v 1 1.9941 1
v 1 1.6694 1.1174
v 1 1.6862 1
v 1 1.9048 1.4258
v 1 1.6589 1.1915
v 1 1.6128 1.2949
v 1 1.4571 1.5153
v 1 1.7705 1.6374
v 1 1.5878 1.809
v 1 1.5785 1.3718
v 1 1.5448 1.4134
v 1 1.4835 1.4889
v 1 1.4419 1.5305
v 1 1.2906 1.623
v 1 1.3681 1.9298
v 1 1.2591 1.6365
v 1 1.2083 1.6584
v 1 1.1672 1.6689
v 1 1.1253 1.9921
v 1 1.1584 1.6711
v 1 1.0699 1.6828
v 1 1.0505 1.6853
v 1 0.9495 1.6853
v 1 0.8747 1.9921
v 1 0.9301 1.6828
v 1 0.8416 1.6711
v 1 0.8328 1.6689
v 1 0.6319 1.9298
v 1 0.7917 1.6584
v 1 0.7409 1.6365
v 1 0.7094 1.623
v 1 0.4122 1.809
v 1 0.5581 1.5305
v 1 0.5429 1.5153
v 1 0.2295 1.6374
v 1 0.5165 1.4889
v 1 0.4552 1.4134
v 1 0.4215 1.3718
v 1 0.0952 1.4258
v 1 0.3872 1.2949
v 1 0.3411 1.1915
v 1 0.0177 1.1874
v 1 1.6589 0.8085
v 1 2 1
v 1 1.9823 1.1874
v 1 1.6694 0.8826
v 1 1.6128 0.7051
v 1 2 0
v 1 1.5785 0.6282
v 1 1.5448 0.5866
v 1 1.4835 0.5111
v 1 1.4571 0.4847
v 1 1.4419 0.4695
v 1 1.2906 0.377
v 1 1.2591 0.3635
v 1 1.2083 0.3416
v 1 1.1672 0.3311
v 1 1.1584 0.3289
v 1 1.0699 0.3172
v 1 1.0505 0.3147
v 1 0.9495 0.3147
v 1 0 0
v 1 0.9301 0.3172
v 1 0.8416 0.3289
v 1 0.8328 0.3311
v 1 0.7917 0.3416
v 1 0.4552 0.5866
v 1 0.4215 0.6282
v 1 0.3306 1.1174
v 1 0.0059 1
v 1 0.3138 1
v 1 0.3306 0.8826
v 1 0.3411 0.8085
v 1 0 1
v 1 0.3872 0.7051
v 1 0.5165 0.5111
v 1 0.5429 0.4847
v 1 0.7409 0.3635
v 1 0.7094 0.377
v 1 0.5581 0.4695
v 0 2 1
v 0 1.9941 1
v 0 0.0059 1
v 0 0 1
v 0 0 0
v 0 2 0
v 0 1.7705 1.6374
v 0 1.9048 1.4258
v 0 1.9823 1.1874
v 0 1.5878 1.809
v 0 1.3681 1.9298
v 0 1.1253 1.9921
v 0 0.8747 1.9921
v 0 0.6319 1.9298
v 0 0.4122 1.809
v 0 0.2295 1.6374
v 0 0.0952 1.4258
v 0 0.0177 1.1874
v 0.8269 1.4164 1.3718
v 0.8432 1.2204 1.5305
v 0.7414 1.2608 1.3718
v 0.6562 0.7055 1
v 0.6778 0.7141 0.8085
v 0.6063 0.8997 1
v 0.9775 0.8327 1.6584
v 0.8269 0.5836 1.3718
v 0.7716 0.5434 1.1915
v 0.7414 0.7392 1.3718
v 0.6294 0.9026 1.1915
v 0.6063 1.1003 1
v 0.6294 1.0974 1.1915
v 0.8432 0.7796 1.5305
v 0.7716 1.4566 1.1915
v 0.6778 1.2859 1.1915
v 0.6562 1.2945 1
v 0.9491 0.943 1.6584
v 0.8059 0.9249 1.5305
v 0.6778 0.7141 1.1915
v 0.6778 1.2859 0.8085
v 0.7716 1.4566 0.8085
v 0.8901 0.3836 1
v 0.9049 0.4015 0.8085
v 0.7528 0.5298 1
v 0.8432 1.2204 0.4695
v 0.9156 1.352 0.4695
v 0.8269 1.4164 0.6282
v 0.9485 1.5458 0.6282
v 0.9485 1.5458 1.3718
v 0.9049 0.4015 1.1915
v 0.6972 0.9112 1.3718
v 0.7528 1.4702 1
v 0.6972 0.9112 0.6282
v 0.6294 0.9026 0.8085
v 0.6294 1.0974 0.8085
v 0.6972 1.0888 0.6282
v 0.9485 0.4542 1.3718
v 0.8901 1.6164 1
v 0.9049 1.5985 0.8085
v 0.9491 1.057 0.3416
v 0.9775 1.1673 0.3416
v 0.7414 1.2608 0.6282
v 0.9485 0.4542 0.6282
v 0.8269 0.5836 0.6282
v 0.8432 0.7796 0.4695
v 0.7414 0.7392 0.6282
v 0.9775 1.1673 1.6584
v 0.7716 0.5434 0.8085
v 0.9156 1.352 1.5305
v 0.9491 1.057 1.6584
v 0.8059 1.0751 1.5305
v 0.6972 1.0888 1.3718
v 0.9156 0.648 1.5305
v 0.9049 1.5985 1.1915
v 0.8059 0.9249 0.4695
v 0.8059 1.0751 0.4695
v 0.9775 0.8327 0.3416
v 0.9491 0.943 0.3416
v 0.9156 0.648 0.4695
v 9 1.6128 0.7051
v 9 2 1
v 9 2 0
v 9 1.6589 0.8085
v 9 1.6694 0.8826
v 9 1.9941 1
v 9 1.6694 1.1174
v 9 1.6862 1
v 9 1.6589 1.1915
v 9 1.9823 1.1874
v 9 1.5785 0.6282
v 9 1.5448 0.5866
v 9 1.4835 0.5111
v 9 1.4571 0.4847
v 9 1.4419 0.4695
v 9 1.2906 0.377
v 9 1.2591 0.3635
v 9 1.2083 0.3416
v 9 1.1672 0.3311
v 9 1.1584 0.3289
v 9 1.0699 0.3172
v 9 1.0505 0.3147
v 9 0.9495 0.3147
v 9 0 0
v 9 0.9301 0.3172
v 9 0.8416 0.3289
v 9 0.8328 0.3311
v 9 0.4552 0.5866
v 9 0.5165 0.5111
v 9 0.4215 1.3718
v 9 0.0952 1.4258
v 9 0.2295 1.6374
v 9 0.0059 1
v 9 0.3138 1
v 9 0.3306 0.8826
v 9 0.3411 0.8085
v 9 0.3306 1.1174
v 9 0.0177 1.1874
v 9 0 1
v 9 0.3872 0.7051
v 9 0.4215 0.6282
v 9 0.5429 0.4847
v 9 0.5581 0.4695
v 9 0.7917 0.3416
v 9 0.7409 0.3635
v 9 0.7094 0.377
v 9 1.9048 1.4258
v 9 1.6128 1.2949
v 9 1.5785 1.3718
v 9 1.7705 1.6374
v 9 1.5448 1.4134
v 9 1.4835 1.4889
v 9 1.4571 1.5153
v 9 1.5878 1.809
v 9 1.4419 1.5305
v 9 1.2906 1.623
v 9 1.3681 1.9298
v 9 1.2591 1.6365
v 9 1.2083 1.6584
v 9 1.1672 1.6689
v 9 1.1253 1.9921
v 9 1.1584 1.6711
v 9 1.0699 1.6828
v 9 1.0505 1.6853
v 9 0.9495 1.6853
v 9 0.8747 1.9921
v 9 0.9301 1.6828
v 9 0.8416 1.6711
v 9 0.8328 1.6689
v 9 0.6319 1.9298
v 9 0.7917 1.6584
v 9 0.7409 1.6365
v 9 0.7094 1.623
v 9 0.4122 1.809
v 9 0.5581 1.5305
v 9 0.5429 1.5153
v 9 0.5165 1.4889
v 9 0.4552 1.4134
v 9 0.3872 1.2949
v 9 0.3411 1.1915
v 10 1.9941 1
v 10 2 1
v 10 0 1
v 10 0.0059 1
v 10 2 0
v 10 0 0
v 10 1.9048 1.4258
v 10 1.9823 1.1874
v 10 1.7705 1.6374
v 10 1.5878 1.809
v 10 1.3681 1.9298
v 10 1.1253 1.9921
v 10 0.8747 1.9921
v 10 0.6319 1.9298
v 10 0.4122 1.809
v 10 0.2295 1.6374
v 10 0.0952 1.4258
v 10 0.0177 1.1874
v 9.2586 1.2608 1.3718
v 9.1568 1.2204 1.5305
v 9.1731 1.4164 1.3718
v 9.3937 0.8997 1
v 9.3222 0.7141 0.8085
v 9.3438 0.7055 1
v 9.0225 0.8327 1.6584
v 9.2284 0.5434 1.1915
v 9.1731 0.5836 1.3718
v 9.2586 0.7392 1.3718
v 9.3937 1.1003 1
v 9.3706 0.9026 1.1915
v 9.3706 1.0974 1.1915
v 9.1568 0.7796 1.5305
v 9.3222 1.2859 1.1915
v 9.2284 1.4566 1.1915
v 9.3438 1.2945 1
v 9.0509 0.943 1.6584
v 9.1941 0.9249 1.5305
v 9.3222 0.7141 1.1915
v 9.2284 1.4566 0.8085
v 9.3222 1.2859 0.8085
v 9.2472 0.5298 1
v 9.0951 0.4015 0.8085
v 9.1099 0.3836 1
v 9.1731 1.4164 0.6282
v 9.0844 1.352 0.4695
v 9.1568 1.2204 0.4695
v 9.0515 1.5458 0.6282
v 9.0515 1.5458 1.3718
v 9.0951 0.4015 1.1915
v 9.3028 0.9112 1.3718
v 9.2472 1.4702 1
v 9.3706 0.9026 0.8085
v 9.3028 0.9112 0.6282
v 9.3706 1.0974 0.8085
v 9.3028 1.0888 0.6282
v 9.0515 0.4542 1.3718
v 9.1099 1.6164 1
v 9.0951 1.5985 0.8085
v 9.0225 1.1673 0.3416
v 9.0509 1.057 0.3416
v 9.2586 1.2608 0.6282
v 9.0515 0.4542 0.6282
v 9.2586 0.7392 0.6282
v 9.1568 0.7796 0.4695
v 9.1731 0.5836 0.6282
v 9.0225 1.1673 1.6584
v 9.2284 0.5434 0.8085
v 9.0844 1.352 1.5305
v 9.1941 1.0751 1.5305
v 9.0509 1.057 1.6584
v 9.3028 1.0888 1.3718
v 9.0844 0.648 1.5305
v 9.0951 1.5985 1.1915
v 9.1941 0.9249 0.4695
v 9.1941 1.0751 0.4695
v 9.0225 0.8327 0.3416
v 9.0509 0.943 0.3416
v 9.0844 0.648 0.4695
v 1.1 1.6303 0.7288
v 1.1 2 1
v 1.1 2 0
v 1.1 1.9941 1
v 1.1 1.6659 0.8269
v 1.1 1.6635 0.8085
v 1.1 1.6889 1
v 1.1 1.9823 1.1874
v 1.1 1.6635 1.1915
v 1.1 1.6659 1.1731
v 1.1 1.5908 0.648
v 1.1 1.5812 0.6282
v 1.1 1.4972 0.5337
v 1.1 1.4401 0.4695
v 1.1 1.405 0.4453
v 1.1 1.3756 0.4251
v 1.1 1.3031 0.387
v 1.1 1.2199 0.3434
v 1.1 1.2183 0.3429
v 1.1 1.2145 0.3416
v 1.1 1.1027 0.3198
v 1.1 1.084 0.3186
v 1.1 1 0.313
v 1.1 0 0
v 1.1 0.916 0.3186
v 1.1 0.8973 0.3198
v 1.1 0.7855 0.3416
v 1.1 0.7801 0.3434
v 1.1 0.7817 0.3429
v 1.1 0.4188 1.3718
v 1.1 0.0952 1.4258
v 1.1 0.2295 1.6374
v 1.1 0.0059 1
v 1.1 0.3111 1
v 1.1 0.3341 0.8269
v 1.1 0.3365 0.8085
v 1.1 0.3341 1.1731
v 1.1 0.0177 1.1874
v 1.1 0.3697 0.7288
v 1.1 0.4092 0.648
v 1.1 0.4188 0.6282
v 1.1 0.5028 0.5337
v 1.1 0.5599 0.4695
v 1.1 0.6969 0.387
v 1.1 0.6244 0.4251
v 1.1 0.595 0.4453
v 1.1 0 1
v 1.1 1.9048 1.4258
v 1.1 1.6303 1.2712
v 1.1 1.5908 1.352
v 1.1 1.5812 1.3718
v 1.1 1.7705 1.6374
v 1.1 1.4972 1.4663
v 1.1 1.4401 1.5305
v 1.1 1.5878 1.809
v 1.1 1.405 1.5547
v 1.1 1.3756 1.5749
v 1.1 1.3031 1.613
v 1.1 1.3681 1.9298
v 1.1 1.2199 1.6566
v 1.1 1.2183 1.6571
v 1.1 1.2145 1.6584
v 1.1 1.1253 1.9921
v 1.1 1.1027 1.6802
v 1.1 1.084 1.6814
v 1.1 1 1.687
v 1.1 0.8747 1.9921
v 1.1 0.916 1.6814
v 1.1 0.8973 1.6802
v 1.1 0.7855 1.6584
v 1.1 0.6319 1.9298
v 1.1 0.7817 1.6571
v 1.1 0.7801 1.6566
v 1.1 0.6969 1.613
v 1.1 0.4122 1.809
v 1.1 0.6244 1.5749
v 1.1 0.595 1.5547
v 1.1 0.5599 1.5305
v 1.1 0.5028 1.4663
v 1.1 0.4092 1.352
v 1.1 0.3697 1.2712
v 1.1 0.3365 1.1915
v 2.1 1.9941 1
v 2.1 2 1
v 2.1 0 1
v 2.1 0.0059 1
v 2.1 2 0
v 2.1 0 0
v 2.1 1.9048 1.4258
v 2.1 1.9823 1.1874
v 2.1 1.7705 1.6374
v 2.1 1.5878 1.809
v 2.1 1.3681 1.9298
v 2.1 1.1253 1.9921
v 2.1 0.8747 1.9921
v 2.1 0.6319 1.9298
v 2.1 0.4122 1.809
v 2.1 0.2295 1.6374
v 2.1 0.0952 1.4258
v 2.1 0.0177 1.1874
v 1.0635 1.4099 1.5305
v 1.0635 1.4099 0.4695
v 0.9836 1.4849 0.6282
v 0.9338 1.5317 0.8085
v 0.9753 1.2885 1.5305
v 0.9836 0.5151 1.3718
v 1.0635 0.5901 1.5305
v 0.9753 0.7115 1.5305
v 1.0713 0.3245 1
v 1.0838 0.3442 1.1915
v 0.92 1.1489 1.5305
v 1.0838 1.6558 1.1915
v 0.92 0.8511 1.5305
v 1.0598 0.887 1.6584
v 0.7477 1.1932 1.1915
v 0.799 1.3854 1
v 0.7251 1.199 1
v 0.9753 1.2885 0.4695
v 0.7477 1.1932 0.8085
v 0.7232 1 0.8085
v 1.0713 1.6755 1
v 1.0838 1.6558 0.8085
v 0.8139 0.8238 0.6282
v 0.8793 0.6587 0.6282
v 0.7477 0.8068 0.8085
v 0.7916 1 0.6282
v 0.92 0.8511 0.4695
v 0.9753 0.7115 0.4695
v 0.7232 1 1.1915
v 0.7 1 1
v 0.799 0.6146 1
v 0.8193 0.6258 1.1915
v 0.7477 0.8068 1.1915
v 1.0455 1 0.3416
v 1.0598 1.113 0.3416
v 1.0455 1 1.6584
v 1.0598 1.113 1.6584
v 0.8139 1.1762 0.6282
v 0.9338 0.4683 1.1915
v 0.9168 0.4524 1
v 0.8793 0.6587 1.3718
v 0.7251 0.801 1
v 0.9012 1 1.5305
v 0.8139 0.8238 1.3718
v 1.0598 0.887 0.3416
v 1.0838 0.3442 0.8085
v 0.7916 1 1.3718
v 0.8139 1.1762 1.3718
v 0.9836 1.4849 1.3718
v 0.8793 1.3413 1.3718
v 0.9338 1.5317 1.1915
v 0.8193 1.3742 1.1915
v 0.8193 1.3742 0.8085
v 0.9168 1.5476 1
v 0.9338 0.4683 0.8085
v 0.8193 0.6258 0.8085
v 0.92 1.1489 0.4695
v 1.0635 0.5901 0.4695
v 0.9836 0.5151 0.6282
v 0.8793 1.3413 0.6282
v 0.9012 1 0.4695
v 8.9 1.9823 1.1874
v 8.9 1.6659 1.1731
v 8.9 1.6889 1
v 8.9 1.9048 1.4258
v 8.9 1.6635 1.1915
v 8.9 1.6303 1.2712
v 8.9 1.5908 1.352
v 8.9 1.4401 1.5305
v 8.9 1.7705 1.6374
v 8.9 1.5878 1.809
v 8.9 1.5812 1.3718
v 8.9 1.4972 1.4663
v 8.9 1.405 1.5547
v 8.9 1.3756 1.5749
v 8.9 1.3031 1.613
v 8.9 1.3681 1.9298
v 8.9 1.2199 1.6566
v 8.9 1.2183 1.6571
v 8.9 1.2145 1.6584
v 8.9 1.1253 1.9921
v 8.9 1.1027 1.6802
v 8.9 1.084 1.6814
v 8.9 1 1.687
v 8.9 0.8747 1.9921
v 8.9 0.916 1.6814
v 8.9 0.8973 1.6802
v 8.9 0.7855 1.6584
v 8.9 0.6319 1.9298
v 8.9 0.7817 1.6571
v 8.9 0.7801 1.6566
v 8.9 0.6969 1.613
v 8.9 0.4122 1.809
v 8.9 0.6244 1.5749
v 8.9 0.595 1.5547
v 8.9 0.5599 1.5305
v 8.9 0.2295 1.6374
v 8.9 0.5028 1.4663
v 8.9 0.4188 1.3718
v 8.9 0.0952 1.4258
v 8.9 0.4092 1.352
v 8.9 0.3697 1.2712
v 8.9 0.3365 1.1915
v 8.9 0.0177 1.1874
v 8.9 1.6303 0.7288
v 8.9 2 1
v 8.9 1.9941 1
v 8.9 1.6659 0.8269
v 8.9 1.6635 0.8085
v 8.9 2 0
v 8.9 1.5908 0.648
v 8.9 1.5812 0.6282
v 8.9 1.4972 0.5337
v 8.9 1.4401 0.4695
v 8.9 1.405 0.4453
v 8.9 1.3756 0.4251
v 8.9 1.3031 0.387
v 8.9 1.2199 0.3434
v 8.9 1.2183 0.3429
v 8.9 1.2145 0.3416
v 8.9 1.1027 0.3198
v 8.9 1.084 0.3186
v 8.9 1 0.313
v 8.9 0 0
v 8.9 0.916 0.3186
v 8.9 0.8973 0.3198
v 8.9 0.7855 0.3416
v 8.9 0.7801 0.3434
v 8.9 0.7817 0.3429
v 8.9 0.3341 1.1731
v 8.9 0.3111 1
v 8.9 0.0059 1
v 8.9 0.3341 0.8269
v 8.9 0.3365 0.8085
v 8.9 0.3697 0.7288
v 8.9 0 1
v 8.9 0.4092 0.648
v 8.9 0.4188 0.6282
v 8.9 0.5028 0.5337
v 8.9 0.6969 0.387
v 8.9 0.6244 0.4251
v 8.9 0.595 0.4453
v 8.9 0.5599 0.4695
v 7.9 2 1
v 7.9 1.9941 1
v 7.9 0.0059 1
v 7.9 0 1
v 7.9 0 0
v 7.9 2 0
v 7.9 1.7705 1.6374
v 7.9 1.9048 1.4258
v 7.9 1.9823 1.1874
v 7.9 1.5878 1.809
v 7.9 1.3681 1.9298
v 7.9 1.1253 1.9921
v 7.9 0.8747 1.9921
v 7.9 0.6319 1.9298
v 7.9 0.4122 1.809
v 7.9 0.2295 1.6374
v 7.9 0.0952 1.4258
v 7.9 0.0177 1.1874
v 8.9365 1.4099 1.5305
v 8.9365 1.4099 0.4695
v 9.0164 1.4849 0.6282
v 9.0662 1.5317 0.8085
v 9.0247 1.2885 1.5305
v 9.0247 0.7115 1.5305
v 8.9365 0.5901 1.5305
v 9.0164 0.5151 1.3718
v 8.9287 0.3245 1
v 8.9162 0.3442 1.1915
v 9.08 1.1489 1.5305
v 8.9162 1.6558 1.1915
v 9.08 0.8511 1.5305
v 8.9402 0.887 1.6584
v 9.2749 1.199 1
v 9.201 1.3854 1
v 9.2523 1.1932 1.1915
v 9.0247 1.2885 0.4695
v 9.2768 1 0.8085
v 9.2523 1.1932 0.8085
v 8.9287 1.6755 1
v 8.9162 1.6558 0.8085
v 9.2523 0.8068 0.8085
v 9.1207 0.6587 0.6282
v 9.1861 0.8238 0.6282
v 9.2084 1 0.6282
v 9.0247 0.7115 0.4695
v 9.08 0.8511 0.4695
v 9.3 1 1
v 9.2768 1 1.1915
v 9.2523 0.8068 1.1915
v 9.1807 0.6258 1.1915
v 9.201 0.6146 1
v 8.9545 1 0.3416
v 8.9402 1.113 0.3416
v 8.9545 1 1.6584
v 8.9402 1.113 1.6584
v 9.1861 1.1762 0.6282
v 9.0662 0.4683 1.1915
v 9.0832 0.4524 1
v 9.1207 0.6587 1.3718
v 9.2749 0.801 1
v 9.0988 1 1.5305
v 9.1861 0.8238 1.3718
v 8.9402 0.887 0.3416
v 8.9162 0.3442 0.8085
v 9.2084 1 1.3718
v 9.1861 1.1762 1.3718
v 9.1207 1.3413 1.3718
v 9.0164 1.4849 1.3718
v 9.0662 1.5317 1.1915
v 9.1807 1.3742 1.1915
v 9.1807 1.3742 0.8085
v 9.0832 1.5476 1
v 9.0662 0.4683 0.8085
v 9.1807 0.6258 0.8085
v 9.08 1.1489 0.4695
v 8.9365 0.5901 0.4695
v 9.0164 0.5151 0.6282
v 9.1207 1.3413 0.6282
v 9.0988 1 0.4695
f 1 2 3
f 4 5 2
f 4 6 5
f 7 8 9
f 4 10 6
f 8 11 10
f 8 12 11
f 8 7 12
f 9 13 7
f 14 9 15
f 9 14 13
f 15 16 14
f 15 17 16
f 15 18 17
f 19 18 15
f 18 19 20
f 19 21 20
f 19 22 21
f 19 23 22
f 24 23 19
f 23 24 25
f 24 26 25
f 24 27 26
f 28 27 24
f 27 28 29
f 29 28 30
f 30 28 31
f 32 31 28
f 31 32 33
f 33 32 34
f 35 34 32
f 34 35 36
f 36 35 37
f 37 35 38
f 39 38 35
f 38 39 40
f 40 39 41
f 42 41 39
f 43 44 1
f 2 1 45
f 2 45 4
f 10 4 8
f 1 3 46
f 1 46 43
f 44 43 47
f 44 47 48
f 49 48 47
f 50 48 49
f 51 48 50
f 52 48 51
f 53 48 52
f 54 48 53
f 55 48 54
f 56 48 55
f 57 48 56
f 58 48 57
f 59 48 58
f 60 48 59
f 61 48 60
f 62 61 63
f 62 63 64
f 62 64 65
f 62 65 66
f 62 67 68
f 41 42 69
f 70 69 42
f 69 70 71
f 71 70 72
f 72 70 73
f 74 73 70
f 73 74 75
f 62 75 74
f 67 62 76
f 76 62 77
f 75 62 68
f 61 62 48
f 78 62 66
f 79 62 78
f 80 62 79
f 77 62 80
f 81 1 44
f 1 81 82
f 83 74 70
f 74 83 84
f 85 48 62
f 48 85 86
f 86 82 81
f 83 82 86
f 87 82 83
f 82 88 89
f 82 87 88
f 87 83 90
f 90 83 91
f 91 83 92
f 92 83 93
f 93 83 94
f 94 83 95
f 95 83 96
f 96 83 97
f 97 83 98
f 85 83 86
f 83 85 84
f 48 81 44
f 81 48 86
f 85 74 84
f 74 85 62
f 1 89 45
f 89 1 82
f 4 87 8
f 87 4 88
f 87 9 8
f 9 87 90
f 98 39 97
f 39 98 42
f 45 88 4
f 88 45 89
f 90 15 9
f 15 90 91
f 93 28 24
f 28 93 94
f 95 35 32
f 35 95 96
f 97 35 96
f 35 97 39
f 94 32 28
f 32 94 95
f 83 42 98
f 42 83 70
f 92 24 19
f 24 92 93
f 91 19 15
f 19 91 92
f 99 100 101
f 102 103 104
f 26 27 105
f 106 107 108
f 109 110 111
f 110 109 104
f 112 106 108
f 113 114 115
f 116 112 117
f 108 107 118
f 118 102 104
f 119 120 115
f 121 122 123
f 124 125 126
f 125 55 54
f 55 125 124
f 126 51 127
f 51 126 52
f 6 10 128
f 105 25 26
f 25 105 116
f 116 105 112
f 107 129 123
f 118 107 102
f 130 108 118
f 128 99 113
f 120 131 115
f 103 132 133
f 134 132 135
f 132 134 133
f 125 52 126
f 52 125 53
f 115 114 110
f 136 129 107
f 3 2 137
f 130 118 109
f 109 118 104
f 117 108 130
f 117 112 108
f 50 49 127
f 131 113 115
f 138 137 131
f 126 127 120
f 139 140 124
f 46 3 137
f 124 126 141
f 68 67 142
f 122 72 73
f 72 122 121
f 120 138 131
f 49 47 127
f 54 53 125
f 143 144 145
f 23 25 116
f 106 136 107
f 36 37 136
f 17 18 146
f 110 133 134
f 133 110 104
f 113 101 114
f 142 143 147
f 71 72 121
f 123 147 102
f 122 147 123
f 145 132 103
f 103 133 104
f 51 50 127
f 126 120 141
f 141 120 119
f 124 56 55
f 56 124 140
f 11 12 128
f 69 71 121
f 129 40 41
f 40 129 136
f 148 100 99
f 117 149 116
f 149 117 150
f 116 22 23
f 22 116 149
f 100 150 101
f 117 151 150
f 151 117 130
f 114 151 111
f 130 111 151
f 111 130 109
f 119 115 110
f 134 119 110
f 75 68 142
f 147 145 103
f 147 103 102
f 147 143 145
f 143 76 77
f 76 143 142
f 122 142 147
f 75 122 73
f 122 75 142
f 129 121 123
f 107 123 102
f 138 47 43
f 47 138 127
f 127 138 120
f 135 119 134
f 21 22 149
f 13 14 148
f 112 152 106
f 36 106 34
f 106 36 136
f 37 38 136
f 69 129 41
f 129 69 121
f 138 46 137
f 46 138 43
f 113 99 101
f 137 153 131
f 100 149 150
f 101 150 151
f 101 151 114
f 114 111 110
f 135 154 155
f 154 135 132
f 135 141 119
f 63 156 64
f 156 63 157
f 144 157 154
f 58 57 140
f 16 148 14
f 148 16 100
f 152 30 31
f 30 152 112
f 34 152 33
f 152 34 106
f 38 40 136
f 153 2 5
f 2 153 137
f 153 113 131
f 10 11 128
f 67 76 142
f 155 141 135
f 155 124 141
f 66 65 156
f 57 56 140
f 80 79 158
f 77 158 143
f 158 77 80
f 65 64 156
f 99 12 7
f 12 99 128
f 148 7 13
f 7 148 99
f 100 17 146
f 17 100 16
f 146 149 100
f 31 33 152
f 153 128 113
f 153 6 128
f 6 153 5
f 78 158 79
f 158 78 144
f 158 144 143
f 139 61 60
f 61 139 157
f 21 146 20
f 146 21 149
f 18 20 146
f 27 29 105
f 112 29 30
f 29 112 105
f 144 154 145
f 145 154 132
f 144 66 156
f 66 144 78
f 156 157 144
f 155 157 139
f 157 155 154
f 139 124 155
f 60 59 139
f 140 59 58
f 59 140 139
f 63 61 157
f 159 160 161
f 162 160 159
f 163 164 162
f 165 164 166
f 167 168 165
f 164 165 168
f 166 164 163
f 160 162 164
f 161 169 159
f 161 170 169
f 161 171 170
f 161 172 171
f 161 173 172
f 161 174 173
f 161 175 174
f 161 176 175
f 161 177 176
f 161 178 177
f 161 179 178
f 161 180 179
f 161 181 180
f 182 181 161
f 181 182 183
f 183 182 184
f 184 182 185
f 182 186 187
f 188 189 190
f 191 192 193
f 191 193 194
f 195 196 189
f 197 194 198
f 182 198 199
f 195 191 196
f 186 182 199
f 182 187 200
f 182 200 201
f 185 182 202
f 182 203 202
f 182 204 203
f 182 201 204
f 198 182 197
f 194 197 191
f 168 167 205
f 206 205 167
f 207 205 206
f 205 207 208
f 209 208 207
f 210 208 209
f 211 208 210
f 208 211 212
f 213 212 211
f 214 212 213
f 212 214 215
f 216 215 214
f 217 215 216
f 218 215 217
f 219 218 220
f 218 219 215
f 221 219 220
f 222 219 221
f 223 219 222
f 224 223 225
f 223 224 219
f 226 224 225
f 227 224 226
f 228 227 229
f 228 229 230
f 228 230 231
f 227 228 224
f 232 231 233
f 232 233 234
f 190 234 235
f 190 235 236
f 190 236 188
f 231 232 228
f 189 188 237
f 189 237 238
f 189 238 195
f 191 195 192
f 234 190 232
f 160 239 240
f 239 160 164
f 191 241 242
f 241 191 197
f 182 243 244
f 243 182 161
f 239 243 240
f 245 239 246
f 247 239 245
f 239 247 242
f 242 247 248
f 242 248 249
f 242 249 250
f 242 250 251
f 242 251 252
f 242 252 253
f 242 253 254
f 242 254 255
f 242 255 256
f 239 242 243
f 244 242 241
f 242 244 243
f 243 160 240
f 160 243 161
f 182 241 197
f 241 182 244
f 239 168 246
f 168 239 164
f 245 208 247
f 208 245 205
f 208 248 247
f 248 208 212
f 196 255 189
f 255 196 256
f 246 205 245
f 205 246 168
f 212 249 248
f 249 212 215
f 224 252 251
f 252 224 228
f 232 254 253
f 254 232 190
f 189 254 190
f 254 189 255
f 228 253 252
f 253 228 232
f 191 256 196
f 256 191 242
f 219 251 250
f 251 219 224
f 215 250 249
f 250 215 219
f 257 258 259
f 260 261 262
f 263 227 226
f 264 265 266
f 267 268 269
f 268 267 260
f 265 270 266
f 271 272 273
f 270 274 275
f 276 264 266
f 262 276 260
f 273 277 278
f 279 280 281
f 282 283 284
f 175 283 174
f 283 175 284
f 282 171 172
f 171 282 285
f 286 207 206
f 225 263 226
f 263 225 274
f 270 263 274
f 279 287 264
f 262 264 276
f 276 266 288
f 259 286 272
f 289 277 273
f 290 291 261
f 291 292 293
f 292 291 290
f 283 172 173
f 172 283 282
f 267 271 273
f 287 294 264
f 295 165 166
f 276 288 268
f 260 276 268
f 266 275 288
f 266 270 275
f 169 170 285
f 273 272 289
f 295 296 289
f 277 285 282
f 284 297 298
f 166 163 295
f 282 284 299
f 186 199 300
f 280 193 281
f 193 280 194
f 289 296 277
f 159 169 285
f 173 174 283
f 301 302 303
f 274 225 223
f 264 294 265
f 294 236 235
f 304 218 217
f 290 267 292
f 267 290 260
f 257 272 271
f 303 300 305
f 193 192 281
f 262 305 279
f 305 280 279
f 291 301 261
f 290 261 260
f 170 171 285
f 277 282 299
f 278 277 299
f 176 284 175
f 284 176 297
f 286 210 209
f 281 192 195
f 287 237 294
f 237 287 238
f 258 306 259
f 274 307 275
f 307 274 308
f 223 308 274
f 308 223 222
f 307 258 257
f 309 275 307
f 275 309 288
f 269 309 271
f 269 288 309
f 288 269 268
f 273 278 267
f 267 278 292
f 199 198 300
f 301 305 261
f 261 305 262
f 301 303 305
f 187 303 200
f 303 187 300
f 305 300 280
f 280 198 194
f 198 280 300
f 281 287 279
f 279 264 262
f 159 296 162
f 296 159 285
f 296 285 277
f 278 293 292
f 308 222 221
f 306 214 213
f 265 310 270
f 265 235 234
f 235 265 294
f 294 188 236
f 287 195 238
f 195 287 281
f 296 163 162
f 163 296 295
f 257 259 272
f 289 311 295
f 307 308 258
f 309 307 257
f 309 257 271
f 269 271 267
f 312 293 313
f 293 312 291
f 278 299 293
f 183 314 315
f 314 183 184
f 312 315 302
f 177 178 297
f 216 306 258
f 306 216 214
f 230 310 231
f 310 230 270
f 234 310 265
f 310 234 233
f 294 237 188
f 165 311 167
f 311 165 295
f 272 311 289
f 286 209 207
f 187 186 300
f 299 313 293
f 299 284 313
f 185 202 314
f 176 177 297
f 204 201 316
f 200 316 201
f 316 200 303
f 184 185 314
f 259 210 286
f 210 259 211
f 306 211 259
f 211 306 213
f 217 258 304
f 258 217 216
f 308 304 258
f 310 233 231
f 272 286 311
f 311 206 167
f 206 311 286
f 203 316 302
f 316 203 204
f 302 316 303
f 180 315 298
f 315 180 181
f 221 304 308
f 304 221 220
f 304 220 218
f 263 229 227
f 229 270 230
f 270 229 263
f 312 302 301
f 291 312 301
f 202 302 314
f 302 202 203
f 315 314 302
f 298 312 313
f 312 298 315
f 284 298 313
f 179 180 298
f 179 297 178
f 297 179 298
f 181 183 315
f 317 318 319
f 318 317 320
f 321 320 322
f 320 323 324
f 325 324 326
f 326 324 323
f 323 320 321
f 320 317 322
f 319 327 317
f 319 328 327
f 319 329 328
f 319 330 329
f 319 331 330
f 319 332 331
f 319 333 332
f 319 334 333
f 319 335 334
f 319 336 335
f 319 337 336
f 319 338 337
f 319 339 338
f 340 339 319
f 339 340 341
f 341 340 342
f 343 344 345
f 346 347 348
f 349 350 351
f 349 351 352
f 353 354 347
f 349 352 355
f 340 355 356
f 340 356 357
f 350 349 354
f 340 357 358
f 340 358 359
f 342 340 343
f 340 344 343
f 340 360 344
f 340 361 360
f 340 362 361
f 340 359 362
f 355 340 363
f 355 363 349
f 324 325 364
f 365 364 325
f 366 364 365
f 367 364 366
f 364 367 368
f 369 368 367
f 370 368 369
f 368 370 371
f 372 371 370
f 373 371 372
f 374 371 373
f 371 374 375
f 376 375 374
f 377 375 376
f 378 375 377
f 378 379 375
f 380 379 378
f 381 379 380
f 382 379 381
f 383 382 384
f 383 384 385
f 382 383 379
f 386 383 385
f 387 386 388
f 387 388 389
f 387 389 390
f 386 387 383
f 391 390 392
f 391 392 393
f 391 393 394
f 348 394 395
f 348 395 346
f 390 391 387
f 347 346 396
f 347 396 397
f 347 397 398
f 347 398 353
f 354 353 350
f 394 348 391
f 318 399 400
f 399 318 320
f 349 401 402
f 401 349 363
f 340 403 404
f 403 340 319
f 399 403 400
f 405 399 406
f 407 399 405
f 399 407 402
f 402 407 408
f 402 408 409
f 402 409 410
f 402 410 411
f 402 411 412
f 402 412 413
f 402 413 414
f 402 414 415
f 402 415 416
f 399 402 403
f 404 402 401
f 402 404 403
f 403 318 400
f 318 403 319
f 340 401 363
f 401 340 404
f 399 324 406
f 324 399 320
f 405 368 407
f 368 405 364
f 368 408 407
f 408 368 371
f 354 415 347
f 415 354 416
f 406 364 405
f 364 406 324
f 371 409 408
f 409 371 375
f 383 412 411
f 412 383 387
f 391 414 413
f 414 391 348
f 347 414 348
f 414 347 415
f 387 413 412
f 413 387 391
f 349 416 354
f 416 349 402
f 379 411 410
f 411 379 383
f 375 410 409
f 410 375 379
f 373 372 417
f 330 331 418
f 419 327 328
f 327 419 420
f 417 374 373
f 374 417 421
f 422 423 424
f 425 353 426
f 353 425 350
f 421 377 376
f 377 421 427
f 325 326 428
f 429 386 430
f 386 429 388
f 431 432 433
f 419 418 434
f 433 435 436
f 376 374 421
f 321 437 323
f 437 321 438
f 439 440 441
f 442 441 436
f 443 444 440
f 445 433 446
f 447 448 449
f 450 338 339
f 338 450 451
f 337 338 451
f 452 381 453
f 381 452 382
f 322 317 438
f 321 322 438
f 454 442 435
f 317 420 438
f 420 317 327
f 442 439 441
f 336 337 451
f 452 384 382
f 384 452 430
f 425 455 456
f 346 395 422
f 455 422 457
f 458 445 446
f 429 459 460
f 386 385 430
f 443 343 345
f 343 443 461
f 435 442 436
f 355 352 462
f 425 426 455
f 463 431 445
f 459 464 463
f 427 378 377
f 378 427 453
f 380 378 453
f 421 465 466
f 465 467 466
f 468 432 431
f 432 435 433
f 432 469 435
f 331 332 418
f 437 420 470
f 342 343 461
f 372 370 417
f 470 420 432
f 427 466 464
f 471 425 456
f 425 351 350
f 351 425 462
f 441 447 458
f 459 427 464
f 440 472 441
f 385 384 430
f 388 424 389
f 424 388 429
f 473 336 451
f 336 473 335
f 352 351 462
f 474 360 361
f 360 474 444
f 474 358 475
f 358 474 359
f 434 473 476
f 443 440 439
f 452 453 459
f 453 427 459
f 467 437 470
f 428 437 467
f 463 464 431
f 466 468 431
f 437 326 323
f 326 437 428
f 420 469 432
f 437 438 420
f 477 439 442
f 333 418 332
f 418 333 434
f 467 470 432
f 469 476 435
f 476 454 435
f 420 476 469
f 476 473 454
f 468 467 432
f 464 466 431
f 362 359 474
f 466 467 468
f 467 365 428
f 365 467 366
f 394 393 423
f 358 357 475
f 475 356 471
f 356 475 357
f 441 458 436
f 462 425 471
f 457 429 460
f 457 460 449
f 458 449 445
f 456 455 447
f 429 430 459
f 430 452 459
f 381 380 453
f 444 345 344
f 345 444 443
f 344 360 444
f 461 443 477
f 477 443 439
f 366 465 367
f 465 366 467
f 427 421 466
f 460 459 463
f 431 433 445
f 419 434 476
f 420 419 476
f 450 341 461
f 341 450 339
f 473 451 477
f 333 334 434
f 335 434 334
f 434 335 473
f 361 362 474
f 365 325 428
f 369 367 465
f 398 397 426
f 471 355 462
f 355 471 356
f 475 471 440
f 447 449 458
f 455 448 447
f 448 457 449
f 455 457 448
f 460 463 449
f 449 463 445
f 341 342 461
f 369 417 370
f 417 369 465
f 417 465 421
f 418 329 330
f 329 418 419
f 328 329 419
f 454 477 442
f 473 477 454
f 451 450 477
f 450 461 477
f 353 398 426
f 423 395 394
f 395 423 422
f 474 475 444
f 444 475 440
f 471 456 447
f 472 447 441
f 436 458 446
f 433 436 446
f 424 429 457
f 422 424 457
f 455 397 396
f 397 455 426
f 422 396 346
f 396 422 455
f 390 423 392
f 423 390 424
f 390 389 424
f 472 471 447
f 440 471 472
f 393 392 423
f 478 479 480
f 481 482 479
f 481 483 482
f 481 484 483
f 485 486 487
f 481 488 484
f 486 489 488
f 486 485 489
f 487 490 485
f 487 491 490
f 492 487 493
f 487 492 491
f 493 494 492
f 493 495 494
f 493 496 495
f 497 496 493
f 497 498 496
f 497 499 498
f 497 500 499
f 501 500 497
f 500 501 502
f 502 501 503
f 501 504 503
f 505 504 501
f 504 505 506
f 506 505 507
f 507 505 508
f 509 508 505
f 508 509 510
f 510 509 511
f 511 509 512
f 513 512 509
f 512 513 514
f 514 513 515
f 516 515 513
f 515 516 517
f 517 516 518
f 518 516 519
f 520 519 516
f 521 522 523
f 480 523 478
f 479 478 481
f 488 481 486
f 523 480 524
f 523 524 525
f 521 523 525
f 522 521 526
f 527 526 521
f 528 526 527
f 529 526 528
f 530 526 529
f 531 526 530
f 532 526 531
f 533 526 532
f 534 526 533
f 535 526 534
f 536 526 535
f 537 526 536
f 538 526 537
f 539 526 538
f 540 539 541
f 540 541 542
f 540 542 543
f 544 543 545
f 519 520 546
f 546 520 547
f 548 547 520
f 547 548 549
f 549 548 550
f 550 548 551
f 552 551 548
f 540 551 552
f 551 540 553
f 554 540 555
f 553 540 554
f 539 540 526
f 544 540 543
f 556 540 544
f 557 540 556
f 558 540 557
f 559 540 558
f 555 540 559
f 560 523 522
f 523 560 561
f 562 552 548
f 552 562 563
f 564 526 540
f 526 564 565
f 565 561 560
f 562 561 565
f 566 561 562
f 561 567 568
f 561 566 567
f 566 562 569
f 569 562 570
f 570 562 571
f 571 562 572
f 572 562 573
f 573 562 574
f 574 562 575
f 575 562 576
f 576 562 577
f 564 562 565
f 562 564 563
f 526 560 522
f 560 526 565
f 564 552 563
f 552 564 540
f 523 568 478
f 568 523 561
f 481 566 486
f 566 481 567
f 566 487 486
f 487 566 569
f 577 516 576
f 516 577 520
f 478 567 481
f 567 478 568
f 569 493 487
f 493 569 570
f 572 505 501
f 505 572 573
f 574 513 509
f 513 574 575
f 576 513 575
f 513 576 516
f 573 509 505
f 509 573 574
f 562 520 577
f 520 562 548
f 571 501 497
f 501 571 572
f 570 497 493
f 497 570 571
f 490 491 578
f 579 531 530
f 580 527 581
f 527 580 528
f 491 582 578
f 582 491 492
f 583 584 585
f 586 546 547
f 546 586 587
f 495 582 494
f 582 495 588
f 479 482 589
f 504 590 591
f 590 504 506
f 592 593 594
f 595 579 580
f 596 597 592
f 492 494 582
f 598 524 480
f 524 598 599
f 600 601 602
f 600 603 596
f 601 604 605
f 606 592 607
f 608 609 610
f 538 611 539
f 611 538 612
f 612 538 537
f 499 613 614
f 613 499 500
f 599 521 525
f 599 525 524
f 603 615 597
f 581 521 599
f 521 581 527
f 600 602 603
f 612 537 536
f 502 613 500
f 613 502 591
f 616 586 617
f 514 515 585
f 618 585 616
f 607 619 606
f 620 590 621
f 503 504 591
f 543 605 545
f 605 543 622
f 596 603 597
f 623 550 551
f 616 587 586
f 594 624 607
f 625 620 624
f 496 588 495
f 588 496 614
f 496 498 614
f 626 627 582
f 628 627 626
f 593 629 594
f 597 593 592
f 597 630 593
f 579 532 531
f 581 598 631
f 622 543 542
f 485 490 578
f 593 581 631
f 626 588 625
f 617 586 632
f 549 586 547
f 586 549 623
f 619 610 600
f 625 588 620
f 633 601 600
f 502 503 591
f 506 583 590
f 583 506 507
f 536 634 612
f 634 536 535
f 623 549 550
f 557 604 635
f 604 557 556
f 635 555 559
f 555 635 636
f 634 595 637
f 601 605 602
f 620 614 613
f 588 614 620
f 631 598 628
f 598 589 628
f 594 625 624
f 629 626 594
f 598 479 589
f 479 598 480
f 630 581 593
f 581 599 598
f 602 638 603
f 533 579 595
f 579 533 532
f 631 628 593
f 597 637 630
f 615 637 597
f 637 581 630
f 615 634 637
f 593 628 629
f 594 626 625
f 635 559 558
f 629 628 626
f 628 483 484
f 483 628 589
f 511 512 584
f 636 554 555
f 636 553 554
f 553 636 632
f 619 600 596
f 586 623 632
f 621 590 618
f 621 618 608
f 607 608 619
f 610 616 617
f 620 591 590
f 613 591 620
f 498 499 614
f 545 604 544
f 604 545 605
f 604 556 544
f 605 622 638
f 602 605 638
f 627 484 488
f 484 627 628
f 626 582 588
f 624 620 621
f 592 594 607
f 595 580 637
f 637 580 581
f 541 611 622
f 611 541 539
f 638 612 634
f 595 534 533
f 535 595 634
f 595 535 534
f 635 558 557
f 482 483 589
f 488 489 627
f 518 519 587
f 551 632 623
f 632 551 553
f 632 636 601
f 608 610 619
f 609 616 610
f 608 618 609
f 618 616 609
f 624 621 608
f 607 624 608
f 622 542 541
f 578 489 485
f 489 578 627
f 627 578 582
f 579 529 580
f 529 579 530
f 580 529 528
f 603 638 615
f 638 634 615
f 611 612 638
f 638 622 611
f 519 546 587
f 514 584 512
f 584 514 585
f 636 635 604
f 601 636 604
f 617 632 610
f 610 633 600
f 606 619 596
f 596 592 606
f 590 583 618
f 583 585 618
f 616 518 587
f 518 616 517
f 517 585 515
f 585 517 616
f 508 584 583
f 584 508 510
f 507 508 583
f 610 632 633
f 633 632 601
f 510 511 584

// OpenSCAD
$ballShiftCoeffFirst = 0.4;
$ballShiftCoeffSecond = -0.4;
$holeDiameterCoeff = 0.8;

//Make one part with hole
module makeOneFirstDummy(baseLength, baseWidth, hingeHeight) {
    difference(){
        union(){
            cube([baseLength, baseWidth, hingeHeight]);
            translate([0, baseWidth/2, hingeHeight])
            rotate([0, 90, 0])
            cylinder(baseLength, baseWidth/2, baseWidth/2);
        }
        translate([baseLength + baseWidth*0.5*$ballShiftCoeffFirst, baseWidth/2, hingeHeight])
        intersection(){
            sphere(baseWidth*0.5*$holeDiameterCoeff);
            translate([-baseWidth/2, 0, 0])
            cube(baseWidth, center=true);
        }
    }
}

//Make one part with pin
module makeOneSecondDummy(baseLength, baseWidth, hingeHeight) {
    union(){
        union(){
            cube([baseLength, baseWidth, hingeHeight]);
            translate([0, baseWidth/2, hingeHeight])
            rotate([0, 90, 0])
            cylinder(baseLength, baseWidth/2, baseWidth/2);
        }
        translate([baseLength + baseWidth*0.5*$ballShiftCoeffSecond, baseWidth/2, hingeHeight])
        intersection(){
            sphere(baseWidth*0.5*$holeDiameterCoeff);
            translate([baseWidth/2, 0, 0])
            cube(baseWidth, center=true);
        }
    }
}

//Make one part either with hole or pin
module makeOne(baseLength, baseWidth, hingeHeight, makeHole, center = false) {
    if(center) {
        translate([-baseLength/2, -baseWidth/2, 0])
        if(makeHole)
            makeOneFirstDummy(baseLength, baseWidth, hingeHeight);
        else
            makeOneSecondDummy(baseLength, baseWidth, hingeHeight);
    }
    else {
        if(makeHole)
            makeOneFirstDummy(baseLength, baseWidth, hingeHeight);
        else
            makeOneSecondDummy(baseLength, baseWidth, hingeHeight);
    }
}

//Make one side of hinge pair either.
//Hole side is outer
module makePair(base, hingeL, hingeW, hingeH, makeHole, easingL = 0.0) {
    if(makeHole) {
        makeOne(hingeL, hingeW, hingeH, makeHole);
        
        translate([base, 0, 0])
        mirror([1, 0, 0])
        makeOne(hingeL, hingeW, hingeH, makeHole);
    }
    else {
        translate([2*hingeL + easingL, 0, 0])
        mirror([1, 0, 0])
        makeOne(hingeL, hingeW, hingeH, makeHole);
        
        translate([base - 2*hingeL - easingL, 0, 0])
        makeOne(hingeL, hingeW, hingeH, makeHole);
    }
}

module makePairHole(base, hingeL, hingeW, hingeH) {
    makePair(base, hingeL, hingeW, hingeH, true);
}
module makePairPin(base, hingeL, hingeW, hingeH, easingL = 0.0) {
    makePair(base, hingeL, hingeW, hingeH, false, easingL);
}

//Example
$fn = 25;
//color("green")
//makePairHole(10, 1, 2, 3);
//makePairPin(10, 1, 2, 3, 0.1);

makePairHole(10, 1, 2, 1);
makePairPin(10, 1, 2, 1, 0.1);
